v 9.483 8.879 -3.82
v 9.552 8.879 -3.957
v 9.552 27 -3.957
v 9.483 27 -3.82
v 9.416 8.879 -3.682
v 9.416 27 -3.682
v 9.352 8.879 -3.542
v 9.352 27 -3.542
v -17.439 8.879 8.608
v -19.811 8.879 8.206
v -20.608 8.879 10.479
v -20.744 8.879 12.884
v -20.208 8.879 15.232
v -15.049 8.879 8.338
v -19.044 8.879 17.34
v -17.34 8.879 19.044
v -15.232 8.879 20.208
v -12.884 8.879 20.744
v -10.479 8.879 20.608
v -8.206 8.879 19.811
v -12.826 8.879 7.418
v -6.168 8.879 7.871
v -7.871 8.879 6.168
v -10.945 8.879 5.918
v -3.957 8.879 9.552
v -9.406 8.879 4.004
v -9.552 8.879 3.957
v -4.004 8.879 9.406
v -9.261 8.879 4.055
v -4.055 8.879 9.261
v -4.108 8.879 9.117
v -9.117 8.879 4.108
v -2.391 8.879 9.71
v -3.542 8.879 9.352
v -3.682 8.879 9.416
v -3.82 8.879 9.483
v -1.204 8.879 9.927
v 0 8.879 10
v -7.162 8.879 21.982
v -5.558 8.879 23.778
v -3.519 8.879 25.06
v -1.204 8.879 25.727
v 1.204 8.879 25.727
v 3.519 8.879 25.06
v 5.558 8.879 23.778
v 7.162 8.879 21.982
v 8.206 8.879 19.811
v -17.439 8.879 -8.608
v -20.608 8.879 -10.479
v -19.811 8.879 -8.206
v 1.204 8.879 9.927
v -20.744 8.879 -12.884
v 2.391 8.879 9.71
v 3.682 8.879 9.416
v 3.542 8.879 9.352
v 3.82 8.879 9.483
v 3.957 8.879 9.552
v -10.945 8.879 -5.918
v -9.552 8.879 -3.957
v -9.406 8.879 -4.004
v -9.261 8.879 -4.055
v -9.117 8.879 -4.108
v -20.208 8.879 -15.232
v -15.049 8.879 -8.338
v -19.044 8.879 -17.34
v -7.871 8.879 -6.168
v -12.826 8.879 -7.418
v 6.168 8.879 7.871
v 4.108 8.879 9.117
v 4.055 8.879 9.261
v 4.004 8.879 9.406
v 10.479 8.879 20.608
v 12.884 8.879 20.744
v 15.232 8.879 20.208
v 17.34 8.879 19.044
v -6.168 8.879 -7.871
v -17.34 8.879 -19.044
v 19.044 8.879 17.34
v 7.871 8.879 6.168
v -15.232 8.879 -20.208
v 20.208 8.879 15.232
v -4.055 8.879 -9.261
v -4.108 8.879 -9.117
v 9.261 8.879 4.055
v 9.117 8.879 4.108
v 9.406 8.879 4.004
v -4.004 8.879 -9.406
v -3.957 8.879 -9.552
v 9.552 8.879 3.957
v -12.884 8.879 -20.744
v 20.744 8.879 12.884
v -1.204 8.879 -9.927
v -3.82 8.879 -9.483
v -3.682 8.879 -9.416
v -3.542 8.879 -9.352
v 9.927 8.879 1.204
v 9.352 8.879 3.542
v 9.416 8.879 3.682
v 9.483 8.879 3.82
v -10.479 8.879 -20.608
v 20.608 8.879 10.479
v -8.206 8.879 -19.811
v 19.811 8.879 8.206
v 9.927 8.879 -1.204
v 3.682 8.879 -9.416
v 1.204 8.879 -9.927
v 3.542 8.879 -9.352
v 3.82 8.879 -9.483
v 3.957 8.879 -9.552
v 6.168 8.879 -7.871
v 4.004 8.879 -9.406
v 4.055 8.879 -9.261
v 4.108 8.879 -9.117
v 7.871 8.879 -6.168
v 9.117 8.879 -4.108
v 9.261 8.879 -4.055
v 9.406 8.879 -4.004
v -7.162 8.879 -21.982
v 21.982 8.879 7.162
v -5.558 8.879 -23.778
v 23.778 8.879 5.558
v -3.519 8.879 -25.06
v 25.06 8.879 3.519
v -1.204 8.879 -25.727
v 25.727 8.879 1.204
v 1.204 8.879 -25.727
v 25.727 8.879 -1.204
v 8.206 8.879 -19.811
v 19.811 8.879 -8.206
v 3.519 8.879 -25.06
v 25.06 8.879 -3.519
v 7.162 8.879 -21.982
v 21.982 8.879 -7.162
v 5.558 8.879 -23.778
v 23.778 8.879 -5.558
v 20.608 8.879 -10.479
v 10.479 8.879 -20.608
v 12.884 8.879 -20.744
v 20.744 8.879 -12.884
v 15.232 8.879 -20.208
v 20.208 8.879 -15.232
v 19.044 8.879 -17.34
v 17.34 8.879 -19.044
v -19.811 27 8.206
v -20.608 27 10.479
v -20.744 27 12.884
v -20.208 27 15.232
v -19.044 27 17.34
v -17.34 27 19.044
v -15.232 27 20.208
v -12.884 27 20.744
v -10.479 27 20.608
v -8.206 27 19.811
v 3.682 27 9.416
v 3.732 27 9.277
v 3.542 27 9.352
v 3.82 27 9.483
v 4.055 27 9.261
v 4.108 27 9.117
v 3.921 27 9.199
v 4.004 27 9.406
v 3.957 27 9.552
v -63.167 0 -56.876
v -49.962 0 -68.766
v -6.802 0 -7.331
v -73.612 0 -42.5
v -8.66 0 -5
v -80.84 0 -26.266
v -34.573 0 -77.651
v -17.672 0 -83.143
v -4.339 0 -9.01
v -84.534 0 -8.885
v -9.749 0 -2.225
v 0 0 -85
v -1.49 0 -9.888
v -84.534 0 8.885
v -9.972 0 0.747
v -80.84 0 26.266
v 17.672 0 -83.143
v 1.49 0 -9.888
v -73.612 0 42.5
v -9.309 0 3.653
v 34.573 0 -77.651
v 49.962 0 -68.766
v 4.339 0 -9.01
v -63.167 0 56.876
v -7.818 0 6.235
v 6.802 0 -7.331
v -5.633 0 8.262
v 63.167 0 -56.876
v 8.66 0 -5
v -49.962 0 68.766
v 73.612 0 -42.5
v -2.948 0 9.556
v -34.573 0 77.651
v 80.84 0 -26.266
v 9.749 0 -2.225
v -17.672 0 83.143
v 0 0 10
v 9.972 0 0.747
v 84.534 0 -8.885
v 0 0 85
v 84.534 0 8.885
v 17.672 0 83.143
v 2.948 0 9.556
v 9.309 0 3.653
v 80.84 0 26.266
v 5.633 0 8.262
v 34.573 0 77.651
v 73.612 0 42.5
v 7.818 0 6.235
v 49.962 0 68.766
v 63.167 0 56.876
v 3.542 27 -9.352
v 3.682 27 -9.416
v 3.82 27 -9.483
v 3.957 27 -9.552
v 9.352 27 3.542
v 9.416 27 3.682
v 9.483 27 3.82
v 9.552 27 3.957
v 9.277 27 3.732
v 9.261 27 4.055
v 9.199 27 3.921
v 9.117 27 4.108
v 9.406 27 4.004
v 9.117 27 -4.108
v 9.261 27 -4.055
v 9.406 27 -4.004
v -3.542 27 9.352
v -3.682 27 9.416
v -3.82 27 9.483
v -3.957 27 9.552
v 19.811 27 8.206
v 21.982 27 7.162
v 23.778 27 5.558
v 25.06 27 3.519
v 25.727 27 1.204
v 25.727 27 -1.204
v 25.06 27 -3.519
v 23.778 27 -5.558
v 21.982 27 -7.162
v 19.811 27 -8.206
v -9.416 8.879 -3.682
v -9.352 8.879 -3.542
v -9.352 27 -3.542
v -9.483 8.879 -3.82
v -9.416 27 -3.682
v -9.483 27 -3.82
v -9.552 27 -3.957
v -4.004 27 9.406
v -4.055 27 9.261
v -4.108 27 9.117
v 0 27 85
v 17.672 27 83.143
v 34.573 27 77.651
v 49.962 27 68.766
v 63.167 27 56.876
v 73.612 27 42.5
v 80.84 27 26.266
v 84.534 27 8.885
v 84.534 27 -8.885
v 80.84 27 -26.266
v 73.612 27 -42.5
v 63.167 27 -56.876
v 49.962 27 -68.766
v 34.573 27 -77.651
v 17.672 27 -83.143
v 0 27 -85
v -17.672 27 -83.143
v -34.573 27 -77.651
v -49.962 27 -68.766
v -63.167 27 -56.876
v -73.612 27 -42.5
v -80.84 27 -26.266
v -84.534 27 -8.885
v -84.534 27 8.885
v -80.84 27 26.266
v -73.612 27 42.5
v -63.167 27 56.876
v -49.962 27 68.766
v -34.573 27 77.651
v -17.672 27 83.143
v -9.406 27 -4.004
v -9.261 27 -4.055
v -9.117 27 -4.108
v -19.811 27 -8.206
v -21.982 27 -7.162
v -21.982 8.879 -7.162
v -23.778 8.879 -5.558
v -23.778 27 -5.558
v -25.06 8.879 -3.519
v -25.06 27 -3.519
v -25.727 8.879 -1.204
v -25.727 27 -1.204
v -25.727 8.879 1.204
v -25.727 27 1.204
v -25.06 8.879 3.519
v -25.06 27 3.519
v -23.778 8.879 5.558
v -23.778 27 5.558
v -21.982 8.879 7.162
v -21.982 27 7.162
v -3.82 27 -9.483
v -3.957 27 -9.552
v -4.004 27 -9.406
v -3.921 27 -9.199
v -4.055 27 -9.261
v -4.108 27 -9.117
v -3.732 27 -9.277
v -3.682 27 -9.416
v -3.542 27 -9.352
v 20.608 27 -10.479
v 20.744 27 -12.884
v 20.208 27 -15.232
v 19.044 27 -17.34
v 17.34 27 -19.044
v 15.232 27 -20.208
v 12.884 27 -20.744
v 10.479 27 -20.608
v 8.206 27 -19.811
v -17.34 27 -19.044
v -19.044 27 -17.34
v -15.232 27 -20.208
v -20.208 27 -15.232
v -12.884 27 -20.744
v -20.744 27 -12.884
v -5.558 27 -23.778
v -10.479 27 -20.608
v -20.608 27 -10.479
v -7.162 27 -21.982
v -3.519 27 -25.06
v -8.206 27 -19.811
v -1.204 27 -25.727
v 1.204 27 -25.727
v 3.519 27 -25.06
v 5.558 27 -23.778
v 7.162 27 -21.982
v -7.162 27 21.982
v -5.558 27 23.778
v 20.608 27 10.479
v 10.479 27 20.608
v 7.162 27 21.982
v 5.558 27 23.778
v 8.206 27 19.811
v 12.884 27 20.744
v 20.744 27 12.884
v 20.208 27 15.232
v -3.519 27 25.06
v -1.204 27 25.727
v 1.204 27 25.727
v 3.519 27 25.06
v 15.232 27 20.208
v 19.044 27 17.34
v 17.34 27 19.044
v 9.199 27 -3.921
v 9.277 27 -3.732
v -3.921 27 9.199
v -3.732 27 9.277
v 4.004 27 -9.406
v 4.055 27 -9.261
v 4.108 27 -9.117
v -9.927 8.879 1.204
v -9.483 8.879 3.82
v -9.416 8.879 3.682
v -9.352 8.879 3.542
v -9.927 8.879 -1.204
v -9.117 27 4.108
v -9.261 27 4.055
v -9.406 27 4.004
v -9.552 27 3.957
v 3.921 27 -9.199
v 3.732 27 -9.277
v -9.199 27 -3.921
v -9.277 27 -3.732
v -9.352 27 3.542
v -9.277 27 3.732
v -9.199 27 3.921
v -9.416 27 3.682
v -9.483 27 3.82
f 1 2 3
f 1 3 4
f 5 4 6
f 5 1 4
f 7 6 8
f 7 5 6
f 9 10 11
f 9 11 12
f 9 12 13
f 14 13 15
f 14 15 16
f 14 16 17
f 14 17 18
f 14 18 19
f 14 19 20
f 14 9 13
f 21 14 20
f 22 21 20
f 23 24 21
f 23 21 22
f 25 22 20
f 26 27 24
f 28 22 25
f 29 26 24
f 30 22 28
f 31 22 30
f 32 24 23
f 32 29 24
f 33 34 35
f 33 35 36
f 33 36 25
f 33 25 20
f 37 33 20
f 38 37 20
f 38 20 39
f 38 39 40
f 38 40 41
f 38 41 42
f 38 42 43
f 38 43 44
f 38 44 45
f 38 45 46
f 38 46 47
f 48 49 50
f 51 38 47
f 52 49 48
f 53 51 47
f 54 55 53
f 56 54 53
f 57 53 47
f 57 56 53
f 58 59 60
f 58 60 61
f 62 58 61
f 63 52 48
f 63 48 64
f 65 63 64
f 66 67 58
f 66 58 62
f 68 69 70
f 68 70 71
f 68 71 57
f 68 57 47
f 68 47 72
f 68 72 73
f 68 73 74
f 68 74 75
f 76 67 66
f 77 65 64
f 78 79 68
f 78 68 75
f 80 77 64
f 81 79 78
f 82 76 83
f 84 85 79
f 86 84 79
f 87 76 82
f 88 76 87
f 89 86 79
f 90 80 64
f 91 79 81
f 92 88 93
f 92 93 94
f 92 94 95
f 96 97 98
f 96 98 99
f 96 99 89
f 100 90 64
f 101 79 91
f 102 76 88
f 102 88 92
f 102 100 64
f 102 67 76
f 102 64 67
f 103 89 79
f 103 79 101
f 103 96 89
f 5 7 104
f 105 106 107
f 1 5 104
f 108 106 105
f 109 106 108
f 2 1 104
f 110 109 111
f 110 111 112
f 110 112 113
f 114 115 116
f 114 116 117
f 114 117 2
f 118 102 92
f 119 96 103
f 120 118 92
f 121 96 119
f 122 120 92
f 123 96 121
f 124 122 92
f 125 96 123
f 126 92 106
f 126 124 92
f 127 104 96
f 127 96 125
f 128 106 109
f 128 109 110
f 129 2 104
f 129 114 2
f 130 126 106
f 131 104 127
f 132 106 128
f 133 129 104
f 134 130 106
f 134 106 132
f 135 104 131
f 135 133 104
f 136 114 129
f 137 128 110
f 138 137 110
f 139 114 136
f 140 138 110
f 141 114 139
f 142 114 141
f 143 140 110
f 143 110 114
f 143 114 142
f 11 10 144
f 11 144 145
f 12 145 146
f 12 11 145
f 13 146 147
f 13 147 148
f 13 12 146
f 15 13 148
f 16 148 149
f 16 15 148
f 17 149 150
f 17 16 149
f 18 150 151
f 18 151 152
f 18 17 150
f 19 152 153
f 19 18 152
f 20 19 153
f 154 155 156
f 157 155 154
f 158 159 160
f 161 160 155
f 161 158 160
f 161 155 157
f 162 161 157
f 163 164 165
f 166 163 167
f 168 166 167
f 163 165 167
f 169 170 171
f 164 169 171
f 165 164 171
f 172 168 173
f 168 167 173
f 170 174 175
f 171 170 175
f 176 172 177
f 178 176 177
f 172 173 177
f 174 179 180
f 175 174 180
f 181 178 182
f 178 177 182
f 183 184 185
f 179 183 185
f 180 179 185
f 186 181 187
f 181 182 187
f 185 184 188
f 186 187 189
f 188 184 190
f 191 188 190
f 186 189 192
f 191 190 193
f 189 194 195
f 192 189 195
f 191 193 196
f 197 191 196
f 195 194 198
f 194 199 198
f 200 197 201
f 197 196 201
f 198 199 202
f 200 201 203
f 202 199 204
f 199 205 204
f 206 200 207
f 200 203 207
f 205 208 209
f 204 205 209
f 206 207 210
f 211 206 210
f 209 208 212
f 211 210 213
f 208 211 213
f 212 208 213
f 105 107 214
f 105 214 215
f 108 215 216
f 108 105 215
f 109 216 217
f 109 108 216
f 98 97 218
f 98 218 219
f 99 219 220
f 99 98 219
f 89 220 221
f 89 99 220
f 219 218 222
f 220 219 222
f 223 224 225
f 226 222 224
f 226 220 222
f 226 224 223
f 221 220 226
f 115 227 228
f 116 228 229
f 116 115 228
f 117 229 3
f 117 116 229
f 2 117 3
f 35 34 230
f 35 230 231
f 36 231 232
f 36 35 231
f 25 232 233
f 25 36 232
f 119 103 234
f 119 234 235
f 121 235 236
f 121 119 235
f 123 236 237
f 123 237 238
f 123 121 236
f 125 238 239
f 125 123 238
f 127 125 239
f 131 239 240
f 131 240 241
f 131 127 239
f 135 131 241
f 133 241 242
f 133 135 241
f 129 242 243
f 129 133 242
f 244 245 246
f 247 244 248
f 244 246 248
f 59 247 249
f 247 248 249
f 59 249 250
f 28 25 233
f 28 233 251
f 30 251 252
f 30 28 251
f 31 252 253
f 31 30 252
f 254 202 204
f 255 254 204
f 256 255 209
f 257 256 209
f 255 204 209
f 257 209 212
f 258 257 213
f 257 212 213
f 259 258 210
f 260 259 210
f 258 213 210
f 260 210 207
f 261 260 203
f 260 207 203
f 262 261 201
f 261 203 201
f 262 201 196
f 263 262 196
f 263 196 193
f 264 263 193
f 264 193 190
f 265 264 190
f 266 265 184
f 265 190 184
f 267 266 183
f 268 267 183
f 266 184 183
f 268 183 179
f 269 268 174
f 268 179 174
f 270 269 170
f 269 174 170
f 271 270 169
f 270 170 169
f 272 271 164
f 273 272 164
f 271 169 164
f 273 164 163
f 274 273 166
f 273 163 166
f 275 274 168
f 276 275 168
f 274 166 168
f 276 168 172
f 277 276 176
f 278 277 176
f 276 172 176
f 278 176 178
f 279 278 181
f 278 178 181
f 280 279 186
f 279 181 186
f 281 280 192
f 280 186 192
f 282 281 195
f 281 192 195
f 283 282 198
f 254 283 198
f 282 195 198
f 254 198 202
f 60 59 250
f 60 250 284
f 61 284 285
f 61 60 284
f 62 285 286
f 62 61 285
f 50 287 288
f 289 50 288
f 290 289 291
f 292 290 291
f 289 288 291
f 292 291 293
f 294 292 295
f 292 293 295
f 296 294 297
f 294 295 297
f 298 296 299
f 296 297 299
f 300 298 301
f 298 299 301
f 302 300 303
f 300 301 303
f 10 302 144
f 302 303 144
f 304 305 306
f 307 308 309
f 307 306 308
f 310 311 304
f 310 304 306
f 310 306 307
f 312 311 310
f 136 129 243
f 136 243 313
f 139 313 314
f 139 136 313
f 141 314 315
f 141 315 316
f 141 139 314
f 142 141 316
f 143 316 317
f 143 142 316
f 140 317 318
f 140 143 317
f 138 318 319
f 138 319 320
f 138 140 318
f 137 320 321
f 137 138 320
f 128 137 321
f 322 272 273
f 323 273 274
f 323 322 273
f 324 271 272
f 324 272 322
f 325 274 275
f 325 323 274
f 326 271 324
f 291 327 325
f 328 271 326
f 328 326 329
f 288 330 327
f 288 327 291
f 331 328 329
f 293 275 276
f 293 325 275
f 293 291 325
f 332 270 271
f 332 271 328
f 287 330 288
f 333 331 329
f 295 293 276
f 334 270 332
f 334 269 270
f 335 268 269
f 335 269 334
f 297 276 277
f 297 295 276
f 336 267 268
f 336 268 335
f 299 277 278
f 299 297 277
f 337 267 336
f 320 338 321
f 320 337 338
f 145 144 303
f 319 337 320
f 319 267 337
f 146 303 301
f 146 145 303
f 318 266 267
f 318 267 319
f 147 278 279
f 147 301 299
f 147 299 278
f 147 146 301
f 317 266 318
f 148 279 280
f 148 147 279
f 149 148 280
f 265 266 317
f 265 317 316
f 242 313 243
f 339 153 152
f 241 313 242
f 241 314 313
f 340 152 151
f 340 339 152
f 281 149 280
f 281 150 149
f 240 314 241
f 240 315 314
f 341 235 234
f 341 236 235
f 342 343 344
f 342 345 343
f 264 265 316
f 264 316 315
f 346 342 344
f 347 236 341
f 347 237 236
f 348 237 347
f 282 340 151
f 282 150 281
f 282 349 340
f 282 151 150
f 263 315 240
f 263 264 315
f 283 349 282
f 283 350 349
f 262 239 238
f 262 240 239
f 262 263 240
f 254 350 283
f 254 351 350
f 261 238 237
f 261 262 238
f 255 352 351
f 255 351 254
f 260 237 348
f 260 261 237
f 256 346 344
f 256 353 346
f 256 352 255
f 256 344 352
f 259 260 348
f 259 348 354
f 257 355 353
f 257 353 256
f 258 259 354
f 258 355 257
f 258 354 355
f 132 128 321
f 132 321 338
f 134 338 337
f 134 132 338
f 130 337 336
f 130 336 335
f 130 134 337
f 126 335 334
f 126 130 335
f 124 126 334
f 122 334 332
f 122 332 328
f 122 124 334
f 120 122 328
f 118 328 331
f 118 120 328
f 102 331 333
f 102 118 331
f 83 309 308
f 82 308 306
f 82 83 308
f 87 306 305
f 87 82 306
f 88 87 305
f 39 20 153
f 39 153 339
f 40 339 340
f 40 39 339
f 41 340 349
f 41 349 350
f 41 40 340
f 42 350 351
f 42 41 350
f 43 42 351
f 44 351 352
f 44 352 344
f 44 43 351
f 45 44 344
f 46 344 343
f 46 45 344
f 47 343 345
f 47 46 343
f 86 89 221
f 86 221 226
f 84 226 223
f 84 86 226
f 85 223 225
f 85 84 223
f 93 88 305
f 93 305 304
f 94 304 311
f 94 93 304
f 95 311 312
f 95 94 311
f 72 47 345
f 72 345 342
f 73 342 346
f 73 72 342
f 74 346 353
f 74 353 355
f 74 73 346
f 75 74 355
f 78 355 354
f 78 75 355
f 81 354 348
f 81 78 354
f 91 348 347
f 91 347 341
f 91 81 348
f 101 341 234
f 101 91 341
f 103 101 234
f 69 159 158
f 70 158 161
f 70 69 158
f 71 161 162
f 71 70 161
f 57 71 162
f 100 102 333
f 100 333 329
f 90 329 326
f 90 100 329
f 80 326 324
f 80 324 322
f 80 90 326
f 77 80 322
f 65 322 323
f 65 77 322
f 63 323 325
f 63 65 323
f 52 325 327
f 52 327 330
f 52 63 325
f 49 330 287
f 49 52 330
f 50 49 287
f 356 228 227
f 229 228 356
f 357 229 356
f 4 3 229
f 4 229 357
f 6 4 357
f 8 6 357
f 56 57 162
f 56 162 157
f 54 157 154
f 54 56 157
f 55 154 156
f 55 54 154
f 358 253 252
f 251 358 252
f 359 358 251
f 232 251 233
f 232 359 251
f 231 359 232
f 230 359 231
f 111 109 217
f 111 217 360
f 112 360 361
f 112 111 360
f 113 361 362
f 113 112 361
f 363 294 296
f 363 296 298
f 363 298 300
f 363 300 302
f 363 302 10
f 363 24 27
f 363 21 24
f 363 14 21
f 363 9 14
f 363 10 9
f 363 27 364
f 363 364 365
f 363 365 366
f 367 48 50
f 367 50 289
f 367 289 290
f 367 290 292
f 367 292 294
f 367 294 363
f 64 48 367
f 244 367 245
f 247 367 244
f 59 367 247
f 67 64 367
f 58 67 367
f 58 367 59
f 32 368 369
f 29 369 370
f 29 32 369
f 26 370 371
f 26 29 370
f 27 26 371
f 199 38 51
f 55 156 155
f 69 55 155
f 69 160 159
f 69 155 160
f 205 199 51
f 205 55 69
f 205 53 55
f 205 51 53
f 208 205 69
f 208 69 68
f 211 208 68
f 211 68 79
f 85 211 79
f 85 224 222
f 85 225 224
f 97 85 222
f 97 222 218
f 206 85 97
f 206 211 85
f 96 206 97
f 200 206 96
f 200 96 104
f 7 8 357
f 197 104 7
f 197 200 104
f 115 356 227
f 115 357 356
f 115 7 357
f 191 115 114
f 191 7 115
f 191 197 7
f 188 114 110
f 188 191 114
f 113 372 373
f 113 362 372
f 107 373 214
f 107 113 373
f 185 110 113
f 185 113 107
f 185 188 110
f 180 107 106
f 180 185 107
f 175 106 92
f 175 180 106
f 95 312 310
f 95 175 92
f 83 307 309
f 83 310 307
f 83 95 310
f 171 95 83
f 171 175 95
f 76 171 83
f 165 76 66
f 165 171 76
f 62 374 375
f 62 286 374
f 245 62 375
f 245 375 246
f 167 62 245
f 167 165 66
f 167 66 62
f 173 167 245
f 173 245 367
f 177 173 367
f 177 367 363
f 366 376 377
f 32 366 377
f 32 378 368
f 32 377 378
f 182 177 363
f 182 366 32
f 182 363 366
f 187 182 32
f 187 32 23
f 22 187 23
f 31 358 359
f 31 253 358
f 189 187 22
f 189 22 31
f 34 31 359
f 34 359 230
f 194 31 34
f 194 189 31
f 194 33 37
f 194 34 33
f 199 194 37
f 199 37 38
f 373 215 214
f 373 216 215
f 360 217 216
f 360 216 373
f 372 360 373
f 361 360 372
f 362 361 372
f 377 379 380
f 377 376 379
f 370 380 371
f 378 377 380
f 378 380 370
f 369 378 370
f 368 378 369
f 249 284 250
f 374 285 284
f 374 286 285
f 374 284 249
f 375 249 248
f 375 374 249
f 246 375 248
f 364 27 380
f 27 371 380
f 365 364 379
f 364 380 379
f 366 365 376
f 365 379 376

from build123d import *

# Parameters (mm, degrees)
SKETCH1_R           = 85
BOSS_EXTRUDE1_DEPTH = 27
SKETCH2_R           = 10
CUT_EXTRUDE1_DEPTH  = 124.203084377
SKETCH3_R           = 8.611328572
CUT_EXTRUDE2_DEPTH  = 18.121123797
CIRPATTERN1_COUNT   = 8


with BuildPart() as part:
    # Sketch1 → Boss-Extrude1 (new body)
    with BuildSketch(Plane(origin=(0, 0, 0), x_dir=(1, 0, 0), z_dir=(0, 1, 0))):
        Circle(SKETCH1_R)
    extrude(amount=BOSS_EXTRUDE1_DEPTH)

    # Sketch2 → Cut-Extrude1 (cut, through all)
    with BuildSketch(Plane(origin=(0, 0, 0), x_dir=(1, 0, 0), z_dir=(0, 1, 0))):
        Circle(SKETCH2_R)
    extrude(amount=CUT_EXTRUDE1_DEPTH, mode=Mode.SUBTRACT)

    # Sketch3 → Cut-Extrude2 (cut)
    with BuildSketch(Plane(origin=(0, 27, 0), x_dir=(1, 0, 0), z_dir=(0, 1, 0))):
        with Locations((-17.200656016, 0)):
            Circle(SKETCH3_R)
    cut_extrude2 = extrude(amount=-CUT_EXTRUDE2_DEPTH, mode=Mode.SUBTRACT)

    # CirPattern1: Cut-Extrude2 ×8 about axis
    cirpattern1_axis = Axis((0, 0, 0), (0, 1, 0))
    for i in range(1, CIRPATTERN1_COUNT):
        add(cut_extrude2.rotate(cirpattern1_axis, i * 360 / CIRPATTERN1_COUNT), mode=Mode.SUBTRACT)


solid = part.part
